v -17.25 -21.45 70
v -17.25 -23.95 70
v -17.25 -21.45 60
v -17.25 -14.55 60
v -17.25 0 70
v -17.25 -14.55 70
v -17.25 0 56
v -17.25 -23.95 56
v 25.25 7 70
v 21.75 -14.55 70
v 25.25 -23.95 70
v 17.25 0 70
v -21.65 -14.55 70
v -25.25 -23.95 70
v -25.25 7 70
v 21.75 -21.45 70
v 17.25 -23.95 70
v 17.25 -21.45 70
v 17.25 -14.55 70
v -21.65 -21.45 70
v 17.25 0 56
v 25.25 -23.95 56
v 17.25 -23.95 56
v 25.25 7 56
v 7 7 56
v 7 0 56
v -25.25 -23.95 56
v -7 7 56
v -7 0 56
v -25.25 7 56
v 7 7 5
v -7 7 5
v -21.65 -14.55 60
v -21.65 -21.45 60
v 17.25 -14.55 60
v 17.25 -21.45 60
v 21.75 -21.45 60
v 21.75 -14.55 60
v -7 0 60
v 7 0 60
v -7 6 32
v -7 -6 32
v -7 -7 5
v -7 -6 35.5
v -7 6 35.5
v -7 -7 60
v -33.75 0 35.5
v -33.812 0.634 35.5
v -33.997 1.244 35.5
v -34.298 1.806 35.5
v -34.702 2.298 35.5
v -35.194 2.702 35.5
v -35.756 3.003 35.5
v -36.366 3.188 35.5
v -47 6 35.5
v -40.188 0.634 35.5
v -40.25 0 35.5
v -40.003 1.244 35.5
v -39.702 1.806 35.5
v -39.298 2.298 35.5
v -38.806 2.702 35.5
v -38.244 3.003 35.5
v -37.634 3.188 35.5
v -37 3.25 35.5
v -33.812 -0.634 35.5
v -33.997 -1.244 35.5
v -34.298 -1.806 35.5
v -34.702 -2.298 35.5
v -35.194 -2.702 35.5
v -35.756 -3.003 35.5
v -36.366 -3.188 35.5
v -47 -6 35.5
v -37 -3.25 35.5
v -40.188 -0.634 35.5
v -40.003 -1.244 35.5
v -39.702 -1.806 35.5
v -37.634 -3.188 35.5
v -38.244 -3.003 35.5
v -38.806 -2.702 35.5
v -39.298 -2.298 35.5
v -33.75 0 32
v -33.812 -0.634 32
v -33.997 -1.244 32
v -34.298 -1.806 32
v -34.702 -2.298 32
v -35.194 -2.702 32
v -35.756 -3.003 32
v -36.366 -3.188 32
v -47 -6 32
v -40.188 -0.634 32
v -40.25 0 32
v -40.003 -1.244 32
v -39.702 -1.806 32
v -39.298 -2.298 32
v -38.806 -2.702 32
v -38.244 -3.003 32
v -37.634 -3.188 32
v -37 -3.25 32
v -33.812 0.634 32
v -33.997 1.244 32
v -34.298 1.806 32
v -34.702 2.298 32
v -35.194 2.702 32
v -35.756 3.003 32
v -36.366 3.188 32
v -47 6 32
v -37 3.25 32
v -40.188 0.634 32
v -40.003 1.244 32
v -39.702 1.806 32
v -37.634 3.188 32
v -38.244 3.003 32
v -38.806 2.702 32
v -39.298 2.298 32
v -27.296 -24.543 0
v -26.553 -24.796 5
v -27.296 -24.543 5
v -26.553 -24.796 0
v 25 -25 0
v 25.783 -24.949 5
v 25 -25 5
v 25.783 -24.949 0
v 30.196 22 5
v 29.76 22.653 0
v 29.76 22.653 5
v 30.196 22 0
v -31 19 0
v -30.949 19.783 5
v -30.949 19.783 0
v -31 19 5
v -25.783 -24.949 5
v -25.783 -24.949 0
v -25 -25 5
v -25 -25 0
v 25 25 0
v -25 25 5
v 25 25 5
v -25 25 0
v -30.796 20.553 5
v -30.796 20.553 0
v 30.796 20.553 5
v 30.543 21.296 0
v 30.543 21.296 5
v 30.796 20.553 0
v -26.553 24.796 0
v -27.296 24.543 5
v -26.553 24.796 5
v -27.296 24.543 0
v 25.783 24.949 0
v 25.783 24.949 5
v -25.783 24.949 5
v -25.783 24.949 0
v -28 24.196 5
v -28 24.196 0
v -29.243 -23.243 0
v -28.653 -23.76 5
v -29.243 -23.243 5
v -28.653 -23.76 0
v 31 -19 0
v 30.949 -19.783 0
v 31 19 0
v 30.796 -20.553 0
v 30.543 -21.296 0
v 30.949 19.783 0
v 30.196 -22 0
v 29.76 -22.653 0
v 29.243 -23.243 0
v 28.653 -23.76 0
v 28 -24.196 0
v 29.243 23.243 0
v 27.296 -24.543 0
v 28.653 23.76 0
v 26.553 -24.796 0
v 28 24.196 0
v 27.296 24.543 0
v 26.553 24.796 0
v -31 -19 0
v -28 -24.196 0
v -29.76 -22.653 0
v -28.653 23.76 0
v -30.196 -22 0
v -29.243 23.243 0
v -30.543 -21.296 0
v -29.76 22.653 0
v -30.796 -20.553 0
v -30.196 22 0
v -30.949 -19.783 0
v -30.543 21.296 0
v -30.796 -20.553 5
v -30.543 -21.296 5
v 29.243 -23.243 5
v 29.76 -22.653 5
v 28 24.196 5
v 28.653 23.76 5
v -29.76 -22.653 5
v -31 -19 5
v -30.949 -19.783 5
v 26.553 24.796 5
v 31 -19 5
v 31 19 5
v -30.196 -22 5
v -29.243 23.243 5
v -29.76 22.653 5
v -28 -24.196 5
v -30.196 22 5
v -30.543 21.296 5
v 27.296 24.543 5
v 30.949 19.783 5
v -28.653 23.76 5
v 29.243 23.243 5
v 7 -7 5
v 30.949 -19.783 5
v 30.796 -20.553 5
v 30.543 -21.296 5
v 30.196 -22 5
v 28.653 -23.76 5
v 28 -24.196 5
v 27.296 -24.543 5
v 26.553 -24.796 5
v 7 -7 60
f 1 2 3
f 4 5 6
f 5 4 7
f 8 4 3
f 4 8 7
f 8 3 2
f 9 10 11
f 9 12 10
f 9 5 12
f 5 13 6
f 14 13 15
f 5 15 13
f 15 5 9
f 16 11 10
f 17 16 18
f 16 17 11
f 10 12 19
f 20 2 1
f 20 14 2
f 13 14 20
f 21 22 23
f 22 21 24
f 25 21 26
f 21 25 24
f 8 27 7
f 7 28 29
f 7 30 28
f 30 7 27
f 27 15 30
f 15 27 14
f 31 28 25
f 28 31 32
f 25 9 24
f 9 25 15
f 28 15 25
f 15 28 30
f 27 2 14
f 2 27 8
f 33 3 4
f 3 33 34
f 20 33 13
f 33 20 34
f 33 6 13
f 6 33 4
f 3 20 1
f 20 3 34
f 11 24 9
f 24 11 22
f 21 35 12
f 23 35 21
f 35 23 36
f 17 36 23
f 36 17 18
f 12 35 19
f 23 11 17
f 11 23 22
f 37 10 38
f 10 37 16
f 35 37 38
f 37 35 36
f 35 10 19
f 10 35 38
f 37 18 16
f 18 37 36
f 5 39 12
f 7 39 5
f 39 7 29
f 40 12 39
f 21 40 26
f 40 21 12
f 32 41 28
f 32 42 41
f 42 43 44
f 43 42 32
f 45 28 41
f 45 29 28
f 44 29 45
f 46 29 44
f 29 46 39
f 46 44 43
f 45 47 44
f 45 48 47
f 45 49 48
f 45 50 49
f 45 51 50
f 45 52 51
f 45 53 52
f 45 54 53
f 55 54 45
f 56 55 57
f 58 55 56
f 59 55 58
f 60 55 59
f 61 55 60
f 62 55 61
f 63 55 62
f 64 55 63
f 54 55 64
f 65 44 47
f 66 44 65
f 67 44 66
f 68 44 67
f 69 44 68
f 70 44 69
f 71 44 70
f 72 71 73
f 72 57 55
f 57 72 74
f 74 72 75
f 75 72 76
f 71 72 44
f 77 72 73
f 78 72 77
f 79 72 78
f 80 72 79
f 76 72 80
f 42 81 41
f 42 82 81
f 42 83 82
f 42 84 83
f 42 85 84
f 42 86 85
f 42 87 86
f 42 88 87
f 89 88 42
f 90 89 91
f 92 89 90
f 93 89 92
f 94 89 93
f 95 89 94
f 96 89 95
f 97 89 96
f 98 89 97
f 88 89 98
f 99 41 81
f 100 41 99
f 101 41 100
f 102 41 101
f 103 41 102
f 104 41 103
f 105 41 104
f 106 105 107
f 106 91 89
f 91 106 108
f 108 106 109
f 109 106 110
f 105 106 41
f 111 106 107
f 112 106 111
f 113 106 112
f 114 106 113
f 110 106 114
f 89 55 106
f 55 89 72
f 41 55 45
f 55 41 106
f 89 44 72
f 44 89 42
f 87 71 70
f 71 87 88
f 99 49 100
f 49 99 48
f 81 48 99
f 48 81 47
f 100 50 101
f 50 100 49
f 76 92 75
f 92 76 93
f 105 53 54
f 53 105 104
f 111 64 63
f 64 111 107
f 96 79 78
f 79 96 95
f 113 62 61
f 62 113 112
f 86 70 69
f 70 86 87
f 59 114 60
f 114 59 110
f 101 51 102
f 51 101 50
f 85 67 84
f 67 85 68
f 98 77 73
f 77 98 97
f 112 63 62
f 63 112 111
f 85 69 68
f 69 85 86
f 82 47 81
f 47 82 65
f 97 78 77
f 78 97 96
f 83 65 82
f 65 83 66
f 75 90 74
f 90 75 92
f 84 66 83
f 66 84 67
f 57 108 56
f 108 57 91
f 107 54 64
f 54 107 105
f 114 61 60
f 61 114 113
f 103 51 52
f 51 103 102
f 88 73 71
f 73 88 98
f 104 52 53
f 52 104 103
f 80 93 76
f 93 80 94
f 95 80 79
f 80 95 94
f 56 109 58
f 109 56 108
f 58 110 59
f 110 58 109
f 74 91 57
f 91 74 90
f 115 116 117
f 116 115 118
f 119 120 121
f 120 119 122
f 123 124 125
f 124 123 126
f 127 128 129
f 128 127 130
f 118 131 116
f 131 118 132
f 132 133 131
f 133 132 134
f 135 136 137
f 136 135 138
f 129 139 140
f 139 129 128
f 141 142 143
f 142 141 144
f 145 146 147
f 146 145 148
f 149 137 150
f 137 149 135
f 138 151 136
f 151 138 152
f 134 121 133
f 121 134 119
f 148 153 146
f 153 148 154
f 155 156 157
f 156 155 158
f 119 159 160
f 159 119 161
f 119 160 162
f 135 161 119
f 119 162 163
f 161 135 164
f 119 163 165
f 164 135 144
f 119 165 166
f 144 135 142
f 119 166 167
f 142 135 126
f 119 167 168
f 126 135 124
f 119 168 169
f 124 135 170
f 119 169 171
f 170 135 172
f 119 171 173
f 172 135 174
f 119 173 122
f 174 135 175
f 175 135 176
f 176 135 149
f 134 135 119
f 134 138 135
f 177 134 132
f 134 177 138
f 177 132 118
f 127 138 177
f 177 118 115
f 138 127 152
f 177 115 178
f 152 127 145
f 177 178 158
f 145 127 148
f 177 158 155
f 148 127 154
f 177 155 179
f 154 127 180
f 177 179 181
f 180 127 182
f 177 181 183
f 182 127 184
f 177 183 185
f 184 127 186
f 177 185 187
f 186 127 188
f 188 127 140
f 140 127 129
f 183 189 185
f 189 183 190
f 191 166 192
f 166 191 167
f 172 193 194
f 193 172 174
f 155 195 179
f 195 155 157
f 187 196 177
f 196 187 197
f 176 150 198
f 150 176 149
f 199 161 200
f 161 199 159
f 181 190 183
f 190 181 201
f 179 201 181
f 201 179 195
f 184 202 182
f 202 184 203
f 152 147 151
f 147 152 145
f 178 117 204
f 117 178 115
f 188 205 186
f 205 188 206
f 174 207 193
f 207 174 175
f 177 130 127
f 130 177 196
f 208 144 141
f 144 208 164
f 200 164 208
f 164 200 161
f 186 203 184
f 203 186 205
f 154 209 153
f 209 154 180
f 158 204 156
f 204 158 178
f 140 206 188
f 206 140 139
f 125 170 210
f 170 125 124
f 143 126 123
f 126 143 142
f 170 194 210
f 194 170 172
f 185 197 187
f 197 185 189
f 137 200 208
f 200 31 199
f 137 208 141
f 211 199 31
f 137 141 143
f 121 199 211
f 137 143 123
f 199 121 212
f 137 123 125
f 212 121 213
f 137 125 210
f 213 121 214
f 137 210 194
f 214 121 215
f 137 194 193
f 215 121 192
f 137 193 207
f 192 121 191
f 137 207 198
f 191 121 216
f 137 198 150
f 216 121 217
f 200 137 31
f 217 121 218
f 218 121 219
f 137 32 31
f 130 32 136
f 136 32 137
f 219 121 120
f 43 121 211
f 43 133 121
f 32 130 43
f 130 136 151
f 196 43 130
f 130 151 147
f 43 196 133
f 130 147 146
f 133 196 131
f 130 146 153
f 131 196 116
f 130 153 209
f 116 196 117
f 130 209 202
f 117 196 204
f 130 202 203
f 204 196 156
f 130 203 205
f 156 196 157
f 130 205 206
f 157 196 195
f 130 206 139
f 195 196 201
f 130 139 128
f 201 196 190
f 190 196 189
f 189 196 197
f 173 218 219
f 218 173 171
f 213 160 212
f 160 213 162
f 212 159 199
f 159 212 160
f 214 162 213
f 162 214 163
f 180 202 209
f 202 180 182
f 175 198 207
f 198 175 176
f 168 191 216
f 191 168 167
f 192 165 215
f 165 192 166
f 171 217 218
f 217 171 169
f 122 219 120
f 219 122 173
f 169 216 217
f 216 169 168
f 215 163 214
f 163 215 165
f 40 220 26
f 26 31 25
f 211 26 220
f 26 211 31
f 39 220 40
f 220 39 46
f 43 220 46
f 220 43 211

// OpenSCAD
// ============================================================
// ESP32-CAM Dev Stand
// Fits FORIOT ESP32-CAM + MB V1541 tray (with pivot pins)
// No hardware required — printed friction pivot
// ============================================================
//
// PARTS — set SHOW to export each STL:
//   "tray_pins"  modified tray with side pivot pins
//   "stand"      base + neck + arms + antenna tab (one piece)
//   "preview"    assembled view (not for printing)
//
// HOW THE PIVOT WORKS:
//   Tray has 7mm cylindrical pins on both long walls.
//   Horizontal arms extend forward from neck top.
//   Open-top slots at arm tips — case loads by lowering straight down.
//   Slot is 0.3mm narrower than pin (friction) — holds any tilt angle.
//   To remove: lift straight up.
//
// TILT:
//   Case hangs in front of the neck with ~40° forward and ~30° backward
//   clearance before any part of the case contacts the stand.
//
// PRINT:
//   tray_pins — open top up, no supports
//   stand     — base flat on bed, prints upright, no supports needed

SHOW = "stand";
$fn = 48;


// ============================================================
// CASE DIMENSIONS  (must match esp32-cam-case.scad)
// ============================================================

WALL      = 2.0;
FLOOR_T   = 1.0;
CORNER_R  = 3.0;
FIT       = 0.25;
RAIL_H    = 0.8;
RAIL_W    = 1.5;
STEP_H    = 3.0;
WALL_STEP = 1.0;
STEP_FIT  = 0.2;
TRAY_H_TRIM   = 3.0;
CAM_PROTRUDE  = 0.8;
CAM_MOD_THICK = 8.0;
SNAP_R        = 1.2;
SNAP_PROTRUDE = 0.3;
SNAP_Y_INSET  = 5.0;
VENT_D   = 2.2;
VENT_GAP = 5.0;

PCB_W   = 28.0;
PCB_L   = 40.0;
STACK_H = 24.0;

TOTAL_L  = PCB_L;
INNER_W  = PCB_W  + FIT * 2;
INNER_L  = PCB_L  + FIT * 2;
OUTER_W  = INNER_W + WALL * 2;   // 32.5
OUTER_L  = INNER_L + WALL * 2;   // 44.5

PCB_SURFACE_H = STACK_H - CAM_MOD_THICK;
TRAY_H = FLOOR_T + RAIL_H + PCB_SURFACE_H - TRAY_H_TRIM;  // 14.8
LID_H  = CAM_MOD_THICK + STEP_H - CAM_PROTRUDE;            // 10.2

Z_MB_FLOOR   = FLOOR_T + RAIL_H;
Z_BTN_CENTER = Z_MB_FLOOR + 3.0;
BTN_HOLE_D   = 5.0;
BTN_Y        = 9.0;
IO0_FROM_LEFT  = 2.0;
RST_FROM_LEFT  = 26.0;
USBC_FROM_LEFT = 14.0;

CAM_LENS_D            = 9.0;
CAM_MOD_W             = 8.0;
CAM_MOD_L             = 8.0;
CAM_LENS_FROM_CAM_END = 9.0;
CAM_LENS_FROM_LEFT    = 14.0;
LED_D            = 1.5;
LED_FROM_CAM_END = 28.0;
LED_FROM_LEFT    = 24.0;
SD_SLOT_W = 14.0;
SD_SLOT_H =  2.0;
SD_LID_Z_BOTTOM = (Z_MB_FLOOR + 17.0) - ((FLOOR_T + RAIL_H + PCB_SURFACE_H) - STEP_H);


// ============================================================
// STAND PARAMETERS
// ============================================================

// Pivot pin on tray long walls
PIN_D   = 7.0;
PIN_L   = 4.5;
PIN_FIT = 0.05;   // interference per side — slot Y-width = PIN_D - PIN_FIT*2

// Pin position on tray: mid-length, mid-height
PIN_Y = OUTER_L / 2;   // 22.25mm from USB-C end (along case long axis)
PIN_Z = TRAY_H  / 2;   // 7.4mm from tray floor

// Base
BASE_W = 62.0;
BASE_L = 50.0;
BASE_T =  5.0;
BASE_R =  6.0;

// Neck
NECK_H = 55.0;
NECK_W = 14.0;
NECK_D = 14.0;

// Horizontal arms: extend forward (-Y) from neck top, pin slots at tips.
// Case hangs in front of neck — nothing blocks tilt in any direction.
ARM_REACH  = 25.0;  // how far pivot is from neck front face
ARM_BELOW  =  4.0;  // arm height below pivot (structural base)
ARM_ABOVE  = 10.0;  // arm height above pivot = slot depth
ARM_W      =  8.0;  // arm width in X (must be > PIN_D)

// Gap between arm inner face and tray outer wall
ARM_GAP = 1.0;

// Antenna tab — extends left from neck, 40mm long, 12mm wide, 3.5mm thick
// 6.5mm vertical hole at 30mm from neck face (screw from below, nut on top)


// ============================================================
// DERIVED
// ============================================================

PIVOT_Z = BASE_T + NECK_H;   // 60mm — stand Z of pivot

// Arm X positions
ARM_INNER_X = OUTER_W / 2 + ARM_GAP;    // 17.25mm from center
ARM_OUTER_X = ARM_INNER_X + ARM_W;      // 25.25mm from center

// Slot dimensions
SLOT_Y = PIN_D - PIN_FIT * 2;           // 6.7mm — friction fit
SLOT_X = PIN_L - ARM_GAP + 1.0;         // 4.5mm — captures pin end inside arm

// Pivot Y position in stand: ARM_REACH forward of neck front face
PIVOT_Y = NECK_D / 2 - ARM_REACH;       // 7 - 22 = -15mm (in front of neck)

// Arm tip extends SLOT_Y/2 + 2.5mm past pin axis for material around slot
ARM_TIP_Y = PIVOT_Y - SLOT_Y / 2 - 2.5;  // extra front lip thickness to prevent bending

// Antenna: top face is 10mm below arm connection (PIVOT_Z), height 18mm
ANT_H     = 18.0;
ANT_Z_TOP = PIVOT_Z - 10.0;   // 50mm
ANT_Z_BOT = ANT_Z_TOP - ANT_H; // 32mm


// ============================================================
// UTILITIES
// ============================================================

module rounded_rect(w, l, r) {
    offset(r=r) offset(r=-r) square([w, l]);
}

module rounded_shell(w, l, h, r) {
    difference() {
        linear_extrude(h) rounded_rect(w, l, r);
        translate([WALL, WALL, FLOOR_T])
            linear_extrude(h)
                rounded_rect(w - WALL*2, l - WALL*2, max(r - WALL, 0.5));
    }
}


// ============================================================
// TRAY WITH PIVOT PINS
// ============================================================

module tray_pins() {
    difference() {
        rounded_shell(OUTER_W, OUTER_L, TRAY_H, CORNER_R);

        translate([WALL - WALL_STEP, WALL - WALL_STEP, TRAY_H - STEP_H])
            linear_extrude(STEP_H + 0.1)
                rounded_rect(
                    INNER_W + WALL_STEP * 2,
                    INNER_L + WALL_STEP * 2,
                    max(CORNER_R - WALL + WALL_STEP, 0.5)
                );

        translate([WALL + FIT + USBC_FROM_LEFT - 6.0, -0.1, FLOOR_T + 1.0])
            cube([12.0, WALL + 0.2, 9.0]);

        translate([-0.1, BTN_Y, Z_BTN_CENTER])
            rotate([0, 90, 0])
                cylinder(d=BTN_HOLE_D, h=WALL + FIT + IO0_FROM_LEFT + 0.5);

        translate([OUTER_W + 0.1, BTN_Y, Z_BTN_CENTER])
            rotate([0, -90, 0])
                cylinder(d=BTN_HOLE_D, h=WALL + FIT + (PCB_W - RST_FROM_LEFT) + 0.5);

        btn_channels();
        tray_vents();
    }

    pcb_rails();
    tray_step_snaps();
    pivot_pins();
}

module pcb_rails() {
    translate([WALL, WALL, FLOOR_T])
        cube([RAIL_W, INNER_L, RAIL_H]);
    translate([WALL + INNER_W - RAIL_W, WALL, FLOOR_T])
        cube([RAIL_W, INNER_L, RAIL_H]);
}

module tray_vents() {
    usable_w = INNER_W - RAIL_W * 2;
    cols = max(1, floor(usable_w / VENT_GAP));
    rows = max(1, floor(INNER_L   / VENT_GAP));
    x0 = WALL + RAIL_W + (usable_w - (cols-1)*VENT_GAP) / 2;
    y0 = WALL           + (INNER_L  - (rows-1)*VENT_GAP) / 2;
    for (r=[0:rows-1], c=[0:cols-1])
        translate([x0 + c*VENT_GAP, y0 + r*VENT_GAP, -0.1])
            cylinder(d=VENT_D, h=FLOOR_T + 0.2);
}

module btn_channels() {
    ch_h = TRAY_H - Z_BTN_CENTER + 0.1;
    translate([WALL - WALL_STEP, BTN_Y - BTN_HOLE_D/2, Z_BTN_CENTER - 0.1])
        cube([WALL_STEP, BTN_HOLE_D, ch_h]);
    translate([OUTER_W - WALL, BTN_Y - BTN_HOLE_D/2, Z_BTN_CENTER - 0.1])
        cube([WALL_STEP, BTN_HOLE_D, ch_h]);
}

module tray_step_snaps() {
    snap_z = TRAY_H - STEP_H / 2;
    for (y = [SNAP_Y_INSET, OUTER_L - SNAP_Y_INSET]) {
        translate([WALL - WALL_STEP, y, snap_z])
            rotate([0, 90, 0])
                cylinder(r=SNAP_R, h=SNAP_PROTRUDE, $fn=24);
        translate([OUTER_W - WALL + WALL_STEP, y, snap_z])
            rotate([0, -90, 0])
                cylinder(r=SNAP_R, h=SNAP_PROTRUDE, $fn=24);
    }
}

module pivot_pins() {
    translate([0, PIN_Y, PIN_Z])
        rotate([0, -90, 0])
            cylinder(d=PIN_D, h=PIN_L, $fn=32);
    translate([OUTER_W, PIN_Y, PIN_Z])
        rotate([0, 90, 0])
            cylinder(d=PIN_D, h=PIN_L, $fn=32);
}


// ============================================================
// LID  (preview only — print from esp32-cam-case.scad)
// ============================================================

module lid_step_snap_recesses() {
    step_cut = WALL_STEP + STEP_FIT;
    snap_z   = STEP_H / 2;
    recess_r = SNAP_R + 0.1;
    recess_h = SNAP_PROTRUDE + 0.1;
    for (y = [SNAP_Y_INSET, OUTER_L - SNAP_Y_INSET]) {
        translate([step_cut, y, snap_z])
            rotate([0, 90, 0])
                cylinder(r=recess_r, h=recess_h, $fn=24);
        translate([OUTER_W - step_cut, y, snap_z])
            rotate([0, -90, 0])
                cylinder(r=recess_r, h=recess_h, $fn=24);
    }
}

module lid_step_cut() {
    step_cut = WALL_STEP + STEP_FIT;
    translate([-0.1, -0.1, -0.1])
        linear_extrude(STEP_H + 0.1)
            difference() {
                rounded_rect(OUTER_W + 0.2, OUTER_L + 0.2, CORNER_R);
                translate([step_cut, step_cut, 0])
                    rounded_rect(OUTER_W - step_cut*2, OUTER_L - step_cut*2,
                                 max(CORNER_R - step_cut, 0.5));
            }
}

module lid_rib() {
    face_z = LID_H - FLOOR_T;
    translate([WALL, WALL + 2.0, face_z - 4.0])
        cube([INNER_W, 2.0, 4.0]);
}

module lid() {
    face_z = LID_H - FLOOR_T;
    difference() {
        linear_extrude(LID_H) rounded_rect(OUTER_W, OUTER_L, CORNER_R);
        translate([WALL, WALL, -0.1])
            linear_extrude(face_z + 0.1)
                rounded_rect(INNER_W, INNER_L, max(CORNER_R - WALL, 0.5));
        lid_step_cut();
        translate([WALL + FIT + CAM_LENS_FROM_LEFT,
                   WALL + FIT + TOTAL_L - CAM_LENS_FROM_CAM_END, face_z - 0.1])
            cylinder(d=CAM_LENS_D, h=FLOOR_T + 0.2);
        translate([WALL + FIT + CAM_LENS_FROM_LEFT - CAM_MOD_W/2 - 0.25,
                   WALL + FIT + TOTAL_L - CAM_LENS_FROM_CAM_END - CAM_MOD_L/2 - 0.25,
                   face_z - CAM_MOD_THICK - 0.5])
            cube([CAM_MOD_W + 0.5, CAM_MOD_L + 0.5, CAM_MOD_THICK + 0.5]);
        translate([WALL + FIT + LED_FROM_LEFT,
                   WALL + FIT + TOTAL_L - LED_FROM_CAM_END, face_z - 0.1])
            cylinder(d=LED_D, h=FLOOR_T + 0.2);
        translate([OUTER_W/2 - (SD_SLOT_W + 0.5)/2,
                   OUTER_L - WALL - 0.1, SD_LID_Z_BOTTOM])
            cube([SD_SLOT_W + 0.5, WALL + 0.2, SD_SLOT_H + 1.0]);
        lid_step_snap_recesses();
    }
    lid_rib();
}


// ============================================================
// STAND — one printable piece
// ============================================================
//
// Shape: base → neck → arm assembly → antenna tab.
//
// ARM ASSEMBLY:
//   A wide connecting plate spans the full arm-to-arm width at the neck top.
//   Two arms extend FORWARD (−Y) from the plate, one each side.
//   The case hangs between the arm tips, in FRONT of the neck.
//   Nothing obstructs tilt in any direction.
//
// SLOT:
//   Each arm has an open-top slot at its tip. Slot is narrow in Y (6.7mm)
//   creating friction on the pin. Case loads from above, lifts out upward.

module stand_base() {
    linear_extrude(BASE_T)
        offset(r=BASE_R) offset(r=-BASE_R)
            square([BASE_W, BASE_L], center=true);
}

module stand_neck() {
    translate([-NECK_W/2, -NECK_D/2, BASE_T])
        cube([NECK_W, NECK_D, NECK_H]);
}

module stand_arm_assembly() {
    arm_h  = ARM_BELOW + ARM_ABOVE;
    arm_y0 = ARM_TIP_Y;        // front of arm (furthest forward)
    arm_y1 = NECK_D / 2;       // back of arm (at neck back face)

    // Connecting plate: full width, BACK HALF of neck only (Y=0 to NECK_D/2).
    // Stopping at Y=0 keeps the plate well behind the tray floor,
    // leaving ~10mm clearance at 0° tilt and ~35° of forward tilt room.
    translate([-ARM_OUTER_X, 0, PIVOT_Z - ARM_BELOW])
        cube([ARM_OUTER_X * 2, NECK_D / 2, arm_h]);

    // Two forward-extending arms with open-top slots
    for (side = [-1, 1]) {
        x0 = side > 0 ? ARM_INNER_X : -ARM_OUTER_X;

        difference() {
            // Arm body: full length from tip to neck back face
            translate([x0, arm_y0, PIVOT_Z - ARM_BELOW])
                cube([ARM_W, arm_y1 - arm_y0, arm_h]);

            // Open-top slot: narrow in Y (friction), enters from arm inner face in X
            // Slot bottom = PIVOT_Z; top = open (PIVOT_Z + ARM_ABOVE)
            sx = side > 0 ? ARM_INNER_X - 0.1 : -(ARM_INNER_X + SLOT_X) + 0.1;
            translate([sx, PIVOT_Y - SLOT_Y/2, PIVOT_Z])
                cube([SLOT_X + 0.1, SLOT_Y, ARM_ABOVE + 0.1]);
        }
    }
}

module antenna_tab() {
    // Flat horizontal plate extending left (−X) from neck.
    // 40mm long, 12mm wide, 3.5mm thick.
    // 6.5mm hole at 30mm from neck face — vertical, screw below / nut on top.
    tab_len  = 40.0;
    tab_wide = 12.0;
    tab_t    =  3.5;

    translate([-NECK_W/2 - tab_len, -tab_wide/2, ANT_Z_BOT])
        difference() {
            cube([tab_len, tab_wide, tab_t]);
            translate([tab_len - 30.0, tab_wide/2, -0.1])
                cylinder(d=6.5, h=tab_t + 0.2, $fn=32);
        }
}

module stand() {
    stand_base();
    stand_neck();
    stand_arm_assembly();
    antenna_tab();
}


// ============================================================
// RENDER
// ============================================================
//
// case_in_stand(): pivot pin of tray → stand position (±OUTER_W/2, PIVOT_Y, PIVOT_Z)
// Rotation: case +Y (camera end) → stand +Z (up)
//           case +Z (lid face)   → stand −Y (toward viewer in OpenSCAD default view)

module case_in_stand() {
    translate([0, PIVOT_Y, PIVOT_Z])
        rotate([90, 0, 0])
            translate([-OUTER_W/2, -PIN_Y, -PIN_Z])
                children();
}

if (SHOW == "tray_pins") {
    tray_pins();
} else if (SHOW == "stand") {
    stand();
} else {
    color("SteelBlue",   0.85) case_in_stand() tray_pins();
    color("YellowGreen", 0.85) case_in_stand() translate([0, 0, TRAY_H - STEP_H]) lid();
    color("Tan", 0.90) stand();
}
